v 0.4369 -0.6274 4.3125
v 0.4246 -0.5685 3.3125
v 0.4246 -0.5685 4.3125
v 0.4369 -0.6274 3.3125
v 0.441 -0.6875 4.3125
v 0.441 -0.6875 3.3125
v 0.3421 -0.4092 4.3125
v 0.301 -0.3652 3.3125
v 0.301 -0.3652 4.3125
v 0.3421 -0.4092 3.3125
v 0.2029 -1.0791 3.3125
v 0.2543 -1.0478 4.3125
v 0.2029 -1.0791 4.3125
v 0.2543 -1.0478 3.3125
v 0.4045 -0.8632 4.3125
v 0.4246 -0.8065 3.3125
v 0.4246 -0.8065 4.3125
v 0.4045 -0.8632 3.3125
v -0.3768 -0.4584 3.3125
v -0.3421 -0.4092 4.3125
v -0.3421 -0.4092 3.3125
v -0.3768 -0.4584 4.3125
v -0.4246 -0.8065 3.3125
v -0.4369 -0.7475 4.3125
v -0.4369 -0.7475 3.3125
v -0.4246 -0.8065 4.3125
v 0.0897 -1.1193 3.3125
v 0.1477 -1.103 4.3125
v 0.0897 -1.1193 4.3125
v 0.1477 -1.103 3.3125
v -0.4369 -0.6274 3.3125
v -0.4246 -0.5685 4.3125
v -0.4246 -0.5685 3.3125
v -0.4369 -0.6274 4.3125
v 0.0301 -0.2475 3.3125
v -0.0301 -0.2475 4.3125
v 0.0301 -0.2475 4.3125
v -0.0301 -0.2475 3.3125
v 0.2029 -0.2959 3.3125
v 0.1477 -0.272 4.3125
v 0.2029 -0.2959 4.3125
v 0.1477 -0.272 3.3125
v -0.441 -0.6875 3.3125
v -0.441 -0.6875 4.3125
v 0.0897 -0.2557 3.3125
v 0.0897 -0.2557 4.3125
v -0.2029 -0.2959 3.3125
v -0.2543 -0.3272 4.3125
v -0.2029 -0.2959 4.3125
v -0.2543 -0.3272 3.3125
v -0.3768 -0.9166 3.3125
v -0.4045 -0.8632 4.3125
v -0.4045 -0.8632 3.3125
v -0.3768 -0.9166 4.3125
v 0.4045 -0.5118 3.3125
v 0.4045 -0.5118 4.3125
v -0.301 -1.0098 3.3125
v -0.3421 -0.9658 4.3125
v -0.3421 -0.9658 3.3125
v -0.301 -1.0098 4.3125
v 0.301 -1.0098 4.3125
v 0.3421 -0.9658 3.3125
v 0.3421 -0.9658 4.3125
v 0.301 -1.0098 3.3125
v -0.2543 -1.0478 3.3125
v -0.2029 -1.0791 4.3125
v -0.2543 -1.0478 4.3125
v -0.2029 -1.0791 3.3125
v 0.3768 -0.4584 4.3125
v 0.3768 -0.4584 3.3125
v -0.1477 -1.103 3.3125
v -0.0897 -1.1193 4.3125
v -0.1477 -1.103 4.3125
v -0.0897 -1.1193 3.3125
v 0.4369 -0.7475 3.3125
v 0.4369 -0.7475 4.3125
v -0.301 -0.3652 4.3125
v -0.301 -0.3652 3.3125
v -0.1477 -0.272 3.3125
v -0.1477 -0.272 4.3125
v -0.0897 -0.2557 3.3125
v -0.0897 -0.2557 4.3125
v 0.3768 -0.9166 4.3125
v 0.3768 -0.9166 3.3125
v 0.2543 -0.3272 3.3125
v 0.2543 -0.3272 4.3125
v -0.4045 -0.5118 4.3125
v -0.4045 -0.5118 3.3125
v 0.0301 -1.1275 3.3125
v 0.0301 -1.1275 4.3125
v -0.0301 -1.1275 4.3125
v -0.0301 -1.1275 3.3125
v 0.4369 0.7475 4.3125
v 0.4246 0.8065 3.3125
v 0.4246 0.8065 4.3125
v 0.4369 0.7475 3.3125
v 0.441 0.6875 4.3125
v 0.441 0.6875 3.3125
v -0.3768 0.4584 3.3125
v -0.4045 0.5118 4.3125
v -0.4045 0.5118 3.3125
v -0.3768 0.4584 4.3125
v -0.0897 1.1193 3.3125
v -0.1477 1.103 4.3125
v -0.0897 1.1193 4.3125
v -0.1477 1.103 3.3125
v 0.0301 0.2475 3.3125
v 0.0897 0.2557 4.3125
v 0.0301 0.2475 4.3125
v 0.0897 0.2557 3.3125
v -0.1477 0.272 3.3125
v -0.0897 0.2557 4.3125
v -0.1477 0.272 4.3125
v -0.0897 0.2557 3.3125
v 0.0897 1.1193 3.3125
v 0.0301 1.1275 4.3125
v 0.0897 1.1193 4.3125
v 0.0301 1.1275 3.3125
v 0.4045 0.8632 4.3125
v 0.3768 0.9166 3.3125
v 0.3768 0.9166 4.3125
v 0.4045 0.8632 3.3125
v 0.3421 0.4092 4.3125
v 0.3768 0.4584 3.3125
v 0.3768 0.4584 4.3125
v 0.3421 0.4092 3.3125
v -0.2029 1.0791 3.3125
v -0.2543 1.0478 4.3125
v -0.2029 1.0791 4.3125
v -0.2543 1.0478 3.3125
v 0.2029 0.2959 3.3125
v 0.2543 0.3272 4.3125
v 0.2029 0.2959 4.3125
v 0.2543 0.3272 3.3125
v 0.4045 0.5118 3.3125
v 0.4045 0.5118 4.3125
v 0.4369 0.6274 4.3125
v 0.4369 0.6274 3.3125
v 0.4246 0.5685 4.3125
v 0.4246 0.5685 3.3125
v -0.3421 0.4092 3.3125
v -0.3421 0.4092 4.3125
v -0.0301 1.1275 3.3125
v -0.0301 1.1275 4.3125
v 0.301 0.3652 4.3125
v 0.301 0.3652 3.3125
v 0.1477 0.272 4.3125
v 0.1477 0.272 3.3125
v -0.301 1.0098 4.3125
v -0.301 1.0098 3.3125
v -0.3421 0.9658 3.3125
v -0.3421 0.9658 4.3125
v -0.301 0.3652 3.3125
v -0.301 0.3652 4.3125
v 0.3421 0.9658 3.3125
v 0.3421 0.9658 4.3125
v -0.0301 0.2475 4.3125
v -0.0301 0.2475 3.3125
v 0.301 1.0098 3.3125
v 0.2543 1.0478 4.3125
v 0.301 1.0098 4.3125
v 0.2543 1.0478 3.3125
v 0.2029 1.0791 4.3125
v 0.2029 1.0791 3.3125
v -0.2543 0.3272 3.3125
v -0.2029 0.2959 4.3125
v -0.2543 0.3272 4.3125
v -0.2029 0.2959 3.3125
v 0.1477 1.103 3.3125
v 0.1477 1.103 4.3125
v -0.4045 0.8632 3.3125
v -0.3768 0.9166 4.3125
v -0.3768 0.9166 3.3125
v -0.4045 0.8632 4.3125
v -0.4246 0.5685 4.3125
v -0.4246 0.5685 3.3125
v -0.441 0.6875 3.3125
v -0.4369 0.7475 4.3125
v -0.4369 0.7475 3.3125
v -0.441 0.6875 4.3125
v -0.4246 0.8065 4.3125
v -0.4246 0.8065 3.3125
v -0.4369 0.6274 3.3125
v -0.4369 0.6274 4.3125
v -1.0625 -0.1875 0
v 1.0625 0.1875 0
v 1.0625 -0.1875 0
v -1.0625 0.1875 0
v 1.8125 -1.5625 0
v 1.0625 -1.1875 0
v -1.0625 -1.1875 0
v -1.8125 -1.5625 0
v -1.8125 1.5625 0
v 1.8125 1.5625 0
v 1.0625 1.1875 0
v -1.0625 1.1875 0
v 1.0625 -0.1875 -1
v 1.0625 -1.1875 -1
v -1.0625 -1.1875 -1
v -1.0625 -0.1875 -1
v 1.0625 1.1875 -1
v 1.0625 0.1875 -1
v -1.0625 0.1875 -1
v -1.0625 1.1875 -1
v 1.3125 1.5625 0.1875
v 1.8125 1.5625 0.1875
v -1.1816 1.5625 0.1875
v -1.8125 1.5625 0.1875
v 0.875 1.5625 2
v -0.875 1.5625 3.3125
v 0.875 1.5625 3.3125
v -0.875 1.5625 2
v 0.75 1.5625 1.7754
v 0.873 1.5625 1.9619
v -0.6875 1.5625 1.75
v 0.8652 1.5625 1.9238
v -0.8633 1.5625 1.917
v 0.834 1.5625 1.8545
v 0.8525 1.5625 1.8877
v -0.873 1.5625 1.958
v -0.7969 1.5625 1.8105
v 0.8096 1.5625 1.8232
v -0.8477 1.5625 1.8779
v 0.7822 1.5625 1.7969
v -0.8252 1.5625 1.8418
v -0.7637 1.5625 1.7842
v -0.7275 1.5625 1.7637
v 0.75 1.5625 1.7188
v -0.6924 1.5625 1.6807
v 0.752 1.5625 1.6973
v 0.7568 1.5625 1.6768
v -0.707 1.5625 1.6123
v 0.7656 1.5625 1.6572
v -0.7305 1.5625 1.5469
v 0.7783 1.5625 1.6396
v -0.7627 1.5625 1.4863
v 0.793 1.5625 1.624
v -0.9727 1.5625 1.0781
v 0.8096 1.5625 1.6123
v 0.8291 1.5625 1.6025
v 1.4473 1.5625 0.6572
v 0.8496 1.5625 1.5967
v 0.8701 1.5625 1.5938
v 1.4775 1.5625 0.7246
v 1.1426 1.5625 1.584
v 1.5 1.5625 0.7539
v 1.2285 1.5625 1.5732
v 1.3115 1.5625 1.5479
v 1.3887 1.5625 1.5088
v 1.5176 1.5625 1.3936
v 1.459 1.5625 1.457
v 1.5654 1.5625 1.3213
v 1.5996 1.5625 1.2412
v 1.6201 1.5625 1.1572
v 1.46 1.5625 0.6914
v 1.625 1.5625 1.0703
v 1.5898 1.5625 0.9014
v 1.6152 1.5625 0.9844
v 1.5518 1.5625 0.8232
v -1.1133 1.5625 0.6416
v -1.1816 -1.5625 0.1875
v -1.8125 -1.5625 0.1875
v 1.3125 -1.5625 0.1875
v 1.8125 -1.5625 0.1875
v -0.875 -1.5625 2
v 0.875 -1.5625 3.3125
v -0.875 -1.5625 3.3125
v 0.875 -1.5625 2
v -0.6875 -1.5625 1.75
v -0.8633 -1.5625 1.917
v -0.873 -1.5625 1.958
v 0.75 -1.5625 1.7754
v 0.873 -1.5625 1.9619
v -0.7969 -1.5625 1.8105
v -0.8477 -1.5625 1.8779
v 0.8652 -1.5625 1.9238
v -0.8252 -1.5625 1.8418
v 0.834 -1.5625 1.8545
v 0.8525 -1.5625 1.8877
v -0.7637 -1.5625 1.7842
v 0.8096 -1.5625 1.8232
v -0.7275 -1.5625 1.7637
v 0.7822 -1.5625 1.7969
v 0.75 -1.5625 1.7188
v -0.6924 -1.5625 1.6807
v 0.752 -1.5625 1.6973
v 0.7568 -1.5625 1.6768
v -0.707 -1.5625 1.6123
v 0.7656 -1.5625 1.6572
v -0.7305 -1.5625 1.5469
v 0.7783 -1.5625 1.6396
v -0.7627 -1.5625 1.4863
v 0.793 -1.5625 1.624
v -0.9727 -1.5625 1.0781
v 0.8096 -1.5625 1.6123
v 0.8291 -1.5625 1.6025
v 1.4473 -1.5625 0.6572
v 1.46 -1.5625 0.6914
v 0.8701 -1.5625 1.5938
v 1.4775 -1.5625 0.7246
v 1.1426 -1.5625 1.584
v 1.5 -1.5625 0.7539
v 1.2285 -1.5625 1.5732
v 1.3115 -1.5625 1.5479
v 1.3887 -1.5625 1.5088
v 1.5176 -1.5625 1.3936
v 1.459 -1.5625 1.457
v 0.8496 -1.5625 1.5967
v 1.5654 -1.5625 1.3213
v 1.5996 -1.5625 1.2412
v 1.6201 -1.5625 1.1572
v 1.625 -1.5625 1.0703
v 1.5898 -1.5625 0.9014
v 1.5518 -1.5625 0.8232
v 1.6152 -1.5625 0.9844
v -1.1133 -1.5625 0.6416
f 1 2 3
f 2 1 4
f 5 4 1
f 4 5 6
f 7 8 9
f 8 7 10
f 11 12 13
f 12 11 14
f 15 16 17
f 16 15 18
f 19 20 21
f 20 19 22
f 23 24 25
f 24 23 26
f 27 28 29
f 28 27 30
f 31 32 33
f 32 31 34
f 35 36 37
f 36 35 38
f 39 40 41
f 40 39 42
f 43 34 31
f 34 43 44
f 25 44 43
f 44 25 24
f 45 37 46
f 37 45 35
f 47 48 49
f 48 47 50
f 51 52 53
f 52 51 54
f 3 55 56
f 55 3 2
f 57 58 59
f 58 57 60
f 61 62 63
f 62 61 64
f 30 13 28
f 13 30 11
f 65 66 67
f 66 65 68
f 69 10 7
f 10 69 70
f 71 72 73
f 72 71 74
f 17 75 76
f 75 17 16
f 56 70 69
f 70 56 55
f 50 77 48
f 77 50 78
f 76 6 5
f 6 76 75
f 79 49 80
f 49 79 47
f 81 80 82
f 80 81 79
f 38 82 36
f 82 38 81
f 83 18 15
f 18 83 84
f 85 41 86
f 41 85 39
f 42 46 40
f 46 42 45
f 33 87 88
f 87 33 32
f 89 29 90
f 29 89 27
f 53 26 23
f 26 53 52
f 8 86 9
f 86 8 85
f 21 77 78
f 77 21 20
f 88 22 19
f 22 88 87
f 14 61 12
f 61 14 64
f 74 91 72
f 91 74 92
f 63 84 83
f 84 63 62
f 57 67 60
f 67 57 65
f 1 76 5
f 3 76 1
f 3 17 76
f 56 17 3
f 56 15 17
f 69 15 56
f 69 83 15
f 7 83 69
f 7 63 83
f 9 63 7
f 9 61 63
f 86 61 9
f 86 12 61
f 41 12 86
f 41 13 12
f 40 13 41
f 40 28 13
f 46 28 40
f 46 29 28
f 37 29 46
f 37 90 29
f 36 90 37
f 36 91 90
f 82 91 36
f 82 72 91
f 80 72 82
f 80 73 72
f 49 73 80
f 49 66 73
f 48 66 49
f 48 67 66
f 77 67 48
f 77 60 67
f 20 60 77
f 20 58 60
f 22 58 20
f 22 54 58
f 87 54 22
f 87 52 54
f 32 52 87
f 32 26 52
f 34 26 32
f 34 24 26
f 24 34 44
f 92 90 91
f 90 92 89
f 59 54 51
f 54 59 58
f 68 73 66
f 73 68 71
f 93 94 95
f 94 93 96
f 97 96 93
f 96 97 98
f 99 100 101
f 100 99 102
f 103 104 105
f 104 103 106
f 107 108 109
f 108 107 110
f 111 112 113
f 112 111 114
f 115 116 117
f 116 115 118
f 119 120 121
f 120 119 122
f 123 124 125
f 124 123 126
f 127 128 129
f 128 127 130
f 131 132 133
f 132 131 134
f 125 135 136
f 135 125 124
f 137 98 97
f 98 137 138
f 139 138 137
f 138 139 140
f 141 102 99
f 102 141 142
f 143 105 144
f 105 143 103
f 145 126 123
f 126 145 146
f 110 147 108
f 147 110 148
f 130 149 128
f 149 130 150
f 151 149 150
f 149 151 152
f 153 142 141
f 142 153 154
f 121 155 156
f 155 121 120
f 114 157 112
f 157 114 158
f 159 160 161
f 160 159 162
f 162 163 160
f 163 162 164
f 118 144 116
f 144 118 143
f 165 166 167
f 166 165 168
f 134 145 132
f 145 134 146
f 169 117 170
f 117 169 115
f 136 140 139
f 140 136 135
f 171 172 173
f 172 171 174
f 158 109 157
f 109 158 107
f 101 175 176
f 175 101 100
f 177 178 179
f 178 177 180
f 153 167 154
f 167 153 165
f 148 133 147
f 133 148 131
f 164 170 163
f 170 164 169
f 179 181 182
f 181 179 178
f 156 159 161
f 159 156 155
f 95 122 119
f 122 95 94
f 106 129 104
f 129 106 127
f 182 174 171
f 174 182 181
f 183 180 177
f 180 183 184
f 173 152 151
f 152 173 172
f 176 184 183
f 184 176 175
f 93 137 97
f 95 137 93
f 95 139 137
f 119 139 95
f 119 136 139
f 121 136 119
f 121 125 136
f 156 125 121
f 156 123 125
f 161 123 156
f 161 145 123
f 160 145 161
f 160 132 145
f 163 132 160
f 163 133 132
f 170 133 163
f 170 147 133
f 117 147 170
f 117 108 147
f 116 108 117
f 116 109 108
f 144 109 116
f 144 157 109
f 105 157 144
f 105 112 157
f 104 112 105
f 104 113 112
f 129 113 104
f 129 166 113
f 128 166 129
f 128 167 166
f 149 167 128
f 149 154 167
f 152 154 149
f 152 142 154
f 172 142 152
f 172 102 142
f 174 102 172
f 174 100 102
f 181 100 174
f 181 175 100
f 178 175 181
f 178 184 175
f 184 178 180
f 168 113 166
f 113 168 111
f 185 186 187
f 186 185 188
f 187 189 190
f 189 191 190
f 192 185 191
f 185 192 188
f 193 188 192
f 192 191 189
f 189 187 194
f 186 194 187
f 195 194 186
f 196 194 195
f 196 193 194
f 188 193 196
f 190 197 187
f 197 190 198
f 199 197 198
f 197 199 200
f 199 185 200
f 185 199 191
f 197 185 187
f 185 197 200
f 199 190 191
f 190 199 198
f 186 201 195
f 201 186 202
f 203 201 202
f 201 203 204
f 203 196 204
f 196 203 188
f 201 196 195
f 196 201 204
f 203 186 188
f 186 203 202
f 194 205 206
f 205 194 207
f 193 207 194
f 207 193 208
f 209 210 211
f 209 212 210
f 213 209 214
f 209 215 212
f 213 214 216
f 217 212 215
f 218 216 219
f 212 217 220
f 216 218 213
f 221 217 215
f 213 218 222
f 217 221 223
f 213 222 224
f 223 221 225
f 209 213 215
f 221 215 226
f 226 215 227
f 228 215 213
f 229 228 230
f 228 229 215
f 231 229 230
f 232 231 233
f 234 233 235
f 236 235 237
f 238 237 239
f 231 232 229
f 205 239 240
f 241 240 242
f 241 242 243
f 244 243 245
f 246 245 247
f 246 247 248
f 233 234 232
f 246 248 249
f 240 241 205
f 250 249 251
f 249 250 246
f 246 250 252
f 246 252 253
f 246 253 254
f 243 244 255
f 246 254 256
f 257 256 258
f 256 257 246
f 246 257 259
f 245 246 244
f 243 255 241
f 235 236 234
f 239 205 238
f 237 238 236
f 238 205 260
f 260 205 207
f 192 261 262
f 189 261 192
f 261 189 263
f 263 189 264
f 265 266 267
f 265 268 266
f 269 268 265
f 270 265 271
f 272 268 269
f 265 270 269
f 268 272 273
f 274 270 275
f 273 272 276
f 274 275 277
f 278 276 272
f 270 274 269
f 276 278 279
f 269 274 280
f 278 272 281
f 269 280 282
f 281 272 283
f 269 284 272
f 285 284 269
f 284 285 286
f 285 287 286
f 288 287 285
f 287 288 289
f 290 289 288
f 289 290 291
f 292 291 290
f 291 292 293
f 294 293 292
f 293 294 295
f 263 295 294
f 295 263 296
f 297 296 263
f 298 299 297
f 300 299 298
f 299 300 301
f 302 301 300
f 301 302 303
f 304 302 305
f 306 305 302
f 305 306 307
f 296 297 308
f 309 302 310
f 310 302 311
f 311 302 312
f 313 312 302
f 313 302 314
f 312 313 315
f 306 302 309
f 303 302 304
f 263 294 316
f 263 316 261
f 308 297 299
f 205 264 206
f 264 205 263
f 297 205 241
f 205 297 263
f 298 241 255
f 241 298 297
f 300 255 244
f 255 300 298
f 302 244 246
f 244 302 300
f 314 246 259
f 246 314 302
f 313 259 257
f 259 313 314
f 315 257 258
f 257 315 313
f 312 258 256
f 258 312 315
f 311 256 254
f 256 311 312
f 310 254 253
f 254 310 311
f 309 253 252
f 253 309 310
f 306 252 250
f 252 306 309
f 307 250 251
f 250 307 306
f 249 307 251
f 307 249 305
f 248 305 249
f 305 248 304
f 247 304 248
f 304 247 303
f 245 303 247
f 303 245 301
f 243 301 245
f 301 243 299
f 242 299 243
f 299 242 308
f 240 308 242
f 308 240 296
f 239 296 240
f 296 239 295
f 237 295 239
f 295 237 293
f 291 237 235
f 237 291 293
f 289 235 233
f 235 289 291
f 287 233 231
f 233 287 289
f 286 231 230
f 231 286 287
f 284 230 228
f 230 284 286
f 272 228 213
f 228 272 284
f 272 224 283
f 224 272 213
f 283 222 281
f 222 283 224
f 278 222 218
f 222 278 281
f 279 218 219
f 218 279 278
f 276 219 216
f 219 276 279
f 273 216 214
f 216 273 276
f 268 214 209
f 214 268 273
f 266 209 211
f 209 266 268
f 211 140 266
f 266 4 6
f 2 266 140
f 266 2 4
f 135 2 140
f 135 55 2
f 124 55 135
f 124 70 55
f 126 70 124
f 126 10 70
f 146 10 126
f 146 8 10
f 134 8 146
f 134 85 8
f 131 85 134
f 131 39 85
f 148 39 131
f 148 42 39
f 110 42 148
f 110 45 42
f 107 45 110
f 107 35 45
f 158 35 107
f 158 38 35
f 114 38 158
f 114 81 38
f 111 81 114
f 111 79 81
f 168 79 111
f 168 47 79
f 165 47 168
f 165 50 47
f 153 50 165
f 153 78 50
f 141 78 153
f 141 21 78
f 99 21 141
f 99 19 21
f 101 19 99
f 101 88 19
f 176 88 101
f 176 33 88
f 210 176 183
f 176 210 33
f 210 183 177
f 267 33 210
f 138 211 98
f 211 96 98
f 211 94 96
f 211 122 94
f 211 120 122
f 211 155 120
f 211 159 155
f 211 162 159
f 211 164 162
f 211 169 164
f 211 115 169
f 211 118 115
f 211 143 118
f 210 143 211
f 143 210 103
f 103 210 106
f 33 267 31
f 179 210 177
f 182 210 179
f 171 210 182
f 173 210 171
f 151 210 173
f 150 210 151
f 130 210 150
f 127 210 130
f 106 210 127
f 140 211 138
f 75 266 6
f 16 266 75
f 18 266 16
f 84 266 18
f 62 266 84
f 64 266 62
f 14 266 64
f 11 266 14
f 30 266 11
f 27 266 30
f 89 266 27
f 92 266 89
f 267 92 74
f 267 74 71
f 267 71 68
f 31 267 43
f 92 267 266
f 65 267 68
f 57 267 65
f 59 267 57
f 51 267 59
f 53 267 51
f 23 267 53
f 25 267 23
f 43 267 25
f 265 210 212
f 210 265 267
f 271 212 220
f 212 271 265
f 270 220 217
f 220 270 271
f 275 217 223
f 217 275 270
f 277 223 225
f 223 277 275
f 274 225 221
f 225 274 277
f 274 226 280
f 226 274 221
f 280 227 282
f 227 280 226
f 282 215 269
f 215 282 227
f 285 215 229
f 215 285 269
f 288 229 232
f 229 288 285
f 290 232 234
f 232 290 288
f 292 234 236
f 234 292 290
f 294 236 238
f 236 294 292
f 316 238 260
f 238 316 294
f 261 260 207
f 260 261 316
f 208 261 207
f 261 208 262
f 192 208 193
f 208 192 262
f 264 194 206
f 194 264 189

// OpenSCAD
//------------------------------------------------------------------
/*

Wallaby Engine Block Core

*/
//------------------------------------------------------------------
// scaling

_desired_scale = 1.25;
_al_shrink = 0.98;
_scale = _desired_scale / _al_shrink;

//------------------------------------------------------------------
// control the number of facets on cylinders

_accuracy = 0.001;
function fn(r) = 180 / acos(1 - (_accuracy / r));

//------------------------------------------------------------------
// cylinder cores

// unscaled sizes: core = 0.875, cylinder bore = 1.000, liner bore = 1.125
// scaled sizes: core = 1.125, cylinder bore = 1.25, liner bore = 1.406
// So: In the scaled engine we have core size that matches a standard dowel and > 1/4"
// of machining tolerance on the liner bore diameter.

cylinder_d = (1 + (1/8)) / _scale; // diameter
cylinder_h = (3 + (5/16)); // height
core_print_h = 1;
c2c_d = (1 + (3/8));

cylinder_r = cylinder_d / 2.0;

module cylinder_core(d) {
	translate([0, d, 0]) {
		cylinder(h = cylinder_h + core_print_h, r = cylinder_r, $fn = fn(cylinder_r));
	}
}

module cylinder_cores() {
	cylinder_core(-c2c_d / 2.0);
	cylinder_core(c2c_d / 2.0);
}

//------------------------------------------------------------------
// camshaft core

camshaft_d = (3/4); // diameter
camshaft_l = 2 + (3/8); // length
camshaft_dx = (1 + (1/8)); // x-displacement
camshaft_dz = 1.084; // z-displacement

camshaft_r = camshaft_d / 2.0;

module camshaft_core() {
	translate([camshaft_dx, 0, camshaft_dz]) {
		rotate([90, 0, 0]) {
			cylinder(h = camshaft_l, r = camshaft_r, center = true, $fn = fn(camshaft_r));
		}
	}
}

//------------------------------------------------------------------
// water jacket

wj_sx = 1 + (1/2);
wj_sy = 2 + (7/8);
wj_sz = 1 + (3/16);
wj_dz = 1 + (14/16) + (wj_sz / 2);

module water_jacket_core() {
	translate([0, 0, wj_dz]) {
		cube(size = [wj_sx, wj_sy, wj_sz], center = true);
	}
}

//------------------------------------------------------------------
// body outline

body_l = 3 + (1/8);

module body_outline() {
	 color([0,1,0,0.3])
    rotate([90,0,0])
    linear_extrude(height = body_l, center = true)
    import(file = "engine_body_outline.dxf", $fn = fn(0.25));
}

//------------------------------------------------------------------
// lower cores

lower_sy = 1;

module lower_core(d) {
    translate([0, d, 0])
    rotate([90,0,0])
    linear_extrude(height = lower_sy, center = true)
    import(file = "lower_core.dxf", layer = "lower_core", $fn = fn(0.25));
}

module lower_cores() {
	lower_core(-c2c_d / 2);
	lower_core(c2c_d / 2);
}

//------------------------------------------------------------------
// lower core prints

lcp_sx = 2 + (1/8);
lcp_sy = lower_sy;
lcp_sz = 1;
lcp_dz = - (lcp_sz / 2);

module lower_core_print(d) {
    translate([0, d, lcp_dz]) {
        cube(size = [lcp_sx, lcp_sy, lcp_sz], center = true);
	 }
}

module lower_core_prints() {
	lower_core_print(-c2c_d / 2);
	lower_core_print(c2c_d / 2);
}

//------------------------------------------------------------------

cylinder_cores();
lower_cores();
lower_core_prints();
water_jacket_core();
camshaft_core();
body_outline();

//------------------------------------------------------------------
